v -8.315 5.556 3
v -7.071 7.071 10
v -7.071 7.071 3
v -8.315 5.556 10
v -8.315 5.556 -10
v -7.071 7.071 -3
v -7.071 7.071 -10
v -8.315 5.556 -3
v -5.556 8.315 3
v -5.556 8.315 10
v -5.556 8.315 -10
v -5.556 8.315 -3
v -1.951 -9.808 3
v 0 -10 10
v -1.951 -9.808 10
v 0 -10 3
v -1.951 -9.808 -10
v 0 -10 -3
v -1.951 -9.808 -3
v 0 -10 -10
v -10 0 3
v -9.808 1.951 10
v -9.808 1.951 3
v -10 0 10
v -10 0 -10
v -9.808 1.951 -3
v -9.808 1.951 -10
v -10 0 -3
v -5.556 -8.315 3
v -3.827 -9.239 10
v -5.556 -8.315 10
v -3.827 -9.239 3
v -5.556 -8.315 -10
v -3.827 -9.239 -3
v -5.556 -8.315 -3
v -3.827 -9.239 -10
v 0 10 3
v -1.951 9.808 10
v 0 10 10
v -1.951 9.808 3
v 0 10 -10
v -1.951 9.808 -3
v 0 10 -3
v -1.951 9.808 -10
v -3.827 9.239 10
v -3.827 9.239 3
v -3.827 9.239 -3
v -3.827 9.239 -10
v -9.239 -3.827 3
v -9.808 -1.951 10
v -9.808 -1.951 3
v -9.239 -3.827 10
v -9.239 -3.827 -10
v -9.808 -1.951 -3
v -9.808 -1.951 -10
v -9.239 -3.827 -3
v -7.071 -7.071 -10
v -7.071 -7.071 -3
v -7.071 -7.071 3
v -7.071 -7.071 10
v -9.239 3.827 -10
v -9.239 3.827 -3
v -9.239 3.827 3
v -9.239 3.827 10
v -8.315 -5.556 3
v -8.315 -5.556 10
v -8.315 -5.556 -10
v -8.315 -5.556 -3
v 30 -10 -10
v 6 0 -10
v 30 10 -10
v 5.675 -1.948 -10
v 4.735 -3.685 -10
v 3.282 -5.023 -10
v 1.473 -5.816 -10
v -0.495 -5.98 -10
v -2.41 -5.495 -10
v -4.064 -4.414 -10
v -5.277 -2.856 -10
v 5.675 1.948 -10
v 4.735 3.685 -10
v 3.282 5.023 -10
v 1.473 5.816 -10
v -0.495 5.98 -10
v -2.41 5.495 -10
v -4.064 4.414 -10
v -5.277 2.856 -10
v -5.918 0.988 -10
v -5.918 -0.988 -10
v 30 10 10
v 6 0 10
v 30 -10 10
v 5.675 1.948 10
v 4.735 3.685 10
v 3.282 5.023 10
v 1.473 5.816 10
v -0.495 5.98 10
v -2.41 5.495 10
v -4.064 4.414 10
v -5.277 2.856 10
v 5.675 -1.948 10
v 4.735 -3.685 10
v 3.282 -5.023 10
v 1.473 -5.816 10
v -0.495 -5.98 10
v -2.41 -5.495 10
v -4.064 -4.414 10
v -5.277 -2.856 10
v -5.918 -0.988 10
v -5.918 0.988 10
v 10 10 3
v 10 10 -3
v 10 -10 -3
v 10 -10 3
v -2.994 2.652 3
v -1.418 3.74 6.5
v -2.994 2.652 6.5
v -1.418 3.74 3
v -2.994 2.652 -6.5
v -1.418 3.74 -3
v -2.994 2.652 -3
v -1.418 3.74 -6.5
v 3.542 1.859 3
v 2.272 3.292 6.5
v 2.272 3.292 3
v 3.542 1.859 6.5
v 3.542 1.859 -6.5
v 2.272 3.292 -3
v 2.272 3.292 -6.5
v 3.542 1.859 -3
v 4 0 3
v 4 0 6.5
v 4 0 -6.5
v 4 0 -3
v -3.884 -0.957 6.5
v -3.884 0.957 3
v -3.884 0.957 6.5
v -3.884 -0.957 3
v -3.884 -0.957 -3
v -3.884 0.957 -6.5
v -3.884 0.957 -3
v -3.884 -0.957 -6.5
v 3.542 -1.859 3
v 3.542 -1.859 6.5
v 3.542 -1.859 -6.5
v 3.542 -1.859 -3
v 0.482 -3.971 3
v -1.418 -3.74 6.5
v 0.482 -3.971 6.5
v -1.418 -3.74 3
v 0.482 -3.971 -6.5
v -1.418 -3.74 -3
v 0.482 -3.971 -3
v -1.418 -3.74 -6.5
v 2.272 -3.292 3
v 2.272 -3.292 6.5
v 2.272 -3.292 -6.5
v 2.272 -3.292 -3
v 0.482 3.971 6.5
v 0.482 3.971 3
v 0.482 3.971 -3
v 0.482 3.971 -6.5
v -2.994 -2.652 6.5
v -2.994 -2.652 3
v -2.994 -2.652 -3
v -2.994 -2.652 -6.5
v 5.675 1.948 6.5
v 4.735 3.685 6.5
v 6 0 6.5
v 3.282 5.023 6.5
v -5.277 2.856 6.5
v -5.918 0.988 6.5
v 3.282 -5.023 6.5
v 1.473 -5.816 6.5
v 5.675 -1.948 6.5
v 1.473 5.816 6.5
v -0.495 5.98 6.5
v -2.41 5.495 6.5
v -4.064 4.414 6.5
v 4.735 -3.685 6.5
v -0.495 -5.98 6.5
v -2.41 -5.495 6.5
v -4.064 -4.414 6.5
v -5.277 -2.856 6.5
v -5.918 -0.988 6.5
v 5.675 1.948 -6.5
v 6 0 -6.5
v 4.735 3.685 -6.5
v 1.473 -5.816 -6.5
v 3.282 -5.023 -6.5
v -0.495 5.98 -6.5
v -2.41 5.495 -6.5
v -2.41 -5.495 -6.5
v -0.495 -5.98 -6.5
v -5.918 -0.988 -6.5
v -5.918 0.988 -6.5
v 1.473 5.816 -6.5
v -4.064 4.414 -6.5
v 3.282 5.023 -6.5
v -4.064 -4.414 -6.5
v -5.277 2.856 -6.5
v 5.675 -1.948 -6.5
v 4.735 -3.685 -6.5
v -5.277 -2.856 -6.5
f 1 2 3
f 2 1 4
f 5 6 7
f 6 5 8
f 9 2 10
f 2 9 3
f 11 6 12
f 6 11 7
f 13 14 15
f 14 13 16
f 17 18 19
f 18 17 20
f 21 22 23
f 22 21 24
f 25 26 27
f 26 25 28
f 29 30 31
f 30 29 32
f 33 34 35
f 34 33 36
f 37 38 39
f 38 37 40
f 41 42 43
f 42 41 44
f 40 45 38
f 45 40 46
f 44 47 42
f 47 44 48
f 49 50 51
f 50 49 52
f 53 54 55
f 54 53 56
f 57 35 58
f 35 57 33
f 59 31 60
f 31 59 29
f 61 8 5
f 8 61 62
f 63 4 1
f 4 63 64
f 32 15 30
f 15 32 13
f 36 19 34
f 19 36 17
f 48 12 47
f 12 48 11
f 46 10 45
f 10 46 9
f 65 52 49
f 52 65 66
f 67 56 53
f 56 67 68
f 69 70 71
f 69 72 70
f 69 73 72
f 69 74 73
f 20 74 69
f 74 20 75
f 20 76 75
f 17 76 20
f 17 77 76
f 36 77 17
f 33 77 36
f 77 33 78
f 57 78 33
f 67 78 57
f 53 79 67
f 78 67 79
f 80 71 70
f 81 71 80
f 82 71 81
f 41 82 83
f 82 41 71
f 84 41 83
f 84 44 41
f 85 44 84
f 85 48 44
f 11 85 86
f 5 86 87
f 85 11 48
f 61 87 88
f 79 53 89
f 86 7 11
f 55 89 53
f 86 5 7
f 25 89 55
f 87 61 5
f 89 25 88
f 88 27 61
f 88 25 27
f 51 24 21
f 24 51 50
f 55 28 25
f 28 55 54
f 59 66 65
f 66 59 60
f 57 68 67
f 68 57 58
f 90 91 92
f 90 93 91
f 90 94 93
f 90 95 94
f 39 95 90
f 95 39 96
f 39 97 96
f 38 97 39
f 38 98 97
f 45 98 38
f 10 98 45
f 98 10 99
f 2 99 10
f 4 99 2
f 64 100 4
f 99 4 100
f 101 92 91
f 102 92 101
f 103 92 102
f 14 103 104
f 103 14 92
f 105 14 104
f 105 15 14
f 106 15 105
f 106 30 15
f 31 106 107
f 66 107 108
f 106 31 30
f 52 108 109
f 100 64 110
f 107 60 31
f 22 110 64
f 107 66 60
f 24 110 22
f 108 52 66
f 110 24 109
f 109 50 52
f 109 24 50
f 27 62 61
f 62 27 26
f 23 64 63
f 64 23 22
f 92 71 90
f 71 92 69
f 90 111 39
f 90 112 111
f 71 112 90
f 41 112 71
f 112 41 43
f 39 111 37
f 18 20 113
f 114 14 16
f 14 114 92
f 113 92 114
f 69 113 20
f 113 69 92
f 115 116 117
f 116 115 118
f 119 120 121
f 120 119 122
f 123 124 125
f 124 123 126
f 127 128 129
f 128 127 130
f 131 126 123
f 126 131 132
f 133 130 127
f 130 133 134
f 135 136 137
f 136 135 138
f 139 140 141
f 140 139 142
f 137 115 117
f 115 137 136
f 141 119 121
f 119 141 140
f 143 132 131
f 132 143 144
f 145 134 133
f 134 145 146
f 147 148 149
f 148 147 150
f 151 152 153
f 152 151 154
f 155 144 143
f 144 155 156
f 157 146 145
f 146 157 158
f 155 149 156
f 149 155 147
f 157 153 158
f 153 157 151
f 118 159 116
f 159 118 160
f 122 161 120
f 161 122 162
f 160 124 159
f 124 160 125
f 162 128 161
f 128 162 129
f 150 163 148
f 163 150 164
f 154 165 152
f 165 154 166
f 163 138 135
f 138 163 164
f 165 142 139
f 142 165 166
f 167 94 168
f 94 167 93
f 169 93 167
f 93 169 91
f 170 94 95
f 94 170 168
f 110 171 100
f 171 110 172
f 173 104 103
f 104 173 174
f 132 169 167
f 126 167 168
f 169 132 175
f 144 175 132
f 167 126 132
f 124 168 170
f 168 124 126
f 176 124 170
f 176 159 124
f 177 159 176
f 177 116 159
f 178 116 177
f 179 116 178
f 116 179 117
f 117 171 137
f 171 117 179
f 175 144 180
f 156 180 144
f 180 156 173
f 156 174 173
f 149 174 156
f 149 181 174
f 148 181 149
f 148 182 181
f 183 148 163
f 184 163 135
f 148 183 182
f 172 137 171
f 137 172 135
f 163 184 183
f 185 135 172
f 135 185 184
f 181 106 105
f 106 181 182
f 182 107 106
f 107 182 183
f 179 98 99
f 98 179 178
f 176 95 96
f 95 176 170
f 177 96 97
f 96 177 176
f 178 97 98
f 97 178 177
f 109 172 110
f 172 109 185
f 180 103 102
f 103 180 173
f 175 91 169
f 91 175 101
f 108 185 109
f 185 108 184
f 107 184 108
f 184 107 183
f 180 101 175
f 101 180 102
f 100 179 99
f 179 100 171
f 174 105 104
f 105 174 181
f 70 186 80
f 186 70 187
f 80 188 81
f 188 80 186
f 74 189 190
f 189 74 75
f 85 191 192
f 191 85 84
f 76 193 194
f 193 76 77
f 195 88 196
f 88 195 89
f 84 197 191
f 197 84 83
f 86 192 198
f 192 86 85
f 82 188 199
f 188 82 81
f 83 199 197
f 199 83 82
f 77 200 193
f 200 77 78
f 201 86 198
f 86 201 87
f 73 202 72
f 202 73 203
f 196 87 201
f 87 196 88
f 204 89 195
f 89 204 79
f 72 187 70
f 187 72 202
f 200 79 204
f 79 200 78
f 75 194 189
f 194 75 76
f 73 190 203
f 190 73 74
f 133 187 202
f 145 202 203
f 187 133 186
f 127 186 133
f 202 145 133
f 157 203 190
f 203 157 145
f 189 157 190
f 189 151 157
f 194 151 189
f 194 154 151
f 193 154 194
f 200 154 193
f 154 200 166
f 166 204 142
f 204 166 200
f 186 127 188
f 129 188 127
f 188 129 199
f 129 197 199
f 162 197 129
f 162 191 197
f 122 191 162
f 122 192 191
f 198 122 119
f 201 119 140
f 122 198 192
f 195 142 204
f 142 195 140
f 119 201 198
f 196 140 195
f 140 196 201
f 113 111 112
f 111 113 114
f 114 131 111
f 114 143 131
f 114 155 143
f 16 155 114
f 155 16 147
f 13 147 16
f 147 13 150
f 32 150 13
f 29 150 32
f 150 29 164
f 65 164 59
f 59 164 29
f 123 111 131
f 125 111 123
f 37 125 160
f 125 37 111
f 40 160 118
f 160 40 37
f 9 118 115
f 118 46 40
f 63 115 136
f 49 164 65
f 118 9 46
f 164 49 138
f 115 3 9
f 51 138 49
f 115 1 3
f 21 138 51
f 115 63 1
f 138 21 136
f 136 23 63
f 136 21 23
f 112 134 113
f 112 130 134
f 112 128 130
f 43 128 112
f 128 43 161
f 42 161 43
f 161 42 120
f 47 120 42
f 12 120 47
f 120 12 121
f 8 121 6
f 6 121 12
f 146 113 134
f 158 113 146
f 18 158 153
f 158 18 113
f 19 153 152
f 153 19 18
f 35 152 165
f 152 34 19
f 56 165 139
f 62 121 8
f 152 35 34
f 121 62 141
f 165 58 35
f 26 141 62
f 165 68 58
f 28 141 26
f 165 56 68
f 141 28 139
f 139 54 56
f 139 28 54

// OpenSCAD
hole_diameter = 8;
mount_width = 20;
hole_screw_depth = 16;
split_width = 6;
mount_height = 30;
shoulder_diameter = 12;
shoulder_depth = 3;

$fa = 0.01;

difference() {
  union() {
    cylinder(mount_width, mount_width/2, mount_width/2, true);
    translate([mount_height/2, 0, 0])
      cube([mount_height, mount_width, mount_width], true);
  }


  cylinder(mount_width + 2, hole_diameter/2, hole_diameter/2, true);

  translate([0, 0, mount_width/2 - shoulder_depth/2])
    cylinder(shoulder_depth + 1, shoulder_diameter/2, shoulder_diameter/2, true);

  translate([0, 0, (mount_width/2 - shoulder_depth/2) * -1])
    cylinder(shoulder_depth + 1, shoulder_diameter/2, shoulder_diameter/2, true);

  cube([mount_width, mount_width + 1, split_width], true);
}
